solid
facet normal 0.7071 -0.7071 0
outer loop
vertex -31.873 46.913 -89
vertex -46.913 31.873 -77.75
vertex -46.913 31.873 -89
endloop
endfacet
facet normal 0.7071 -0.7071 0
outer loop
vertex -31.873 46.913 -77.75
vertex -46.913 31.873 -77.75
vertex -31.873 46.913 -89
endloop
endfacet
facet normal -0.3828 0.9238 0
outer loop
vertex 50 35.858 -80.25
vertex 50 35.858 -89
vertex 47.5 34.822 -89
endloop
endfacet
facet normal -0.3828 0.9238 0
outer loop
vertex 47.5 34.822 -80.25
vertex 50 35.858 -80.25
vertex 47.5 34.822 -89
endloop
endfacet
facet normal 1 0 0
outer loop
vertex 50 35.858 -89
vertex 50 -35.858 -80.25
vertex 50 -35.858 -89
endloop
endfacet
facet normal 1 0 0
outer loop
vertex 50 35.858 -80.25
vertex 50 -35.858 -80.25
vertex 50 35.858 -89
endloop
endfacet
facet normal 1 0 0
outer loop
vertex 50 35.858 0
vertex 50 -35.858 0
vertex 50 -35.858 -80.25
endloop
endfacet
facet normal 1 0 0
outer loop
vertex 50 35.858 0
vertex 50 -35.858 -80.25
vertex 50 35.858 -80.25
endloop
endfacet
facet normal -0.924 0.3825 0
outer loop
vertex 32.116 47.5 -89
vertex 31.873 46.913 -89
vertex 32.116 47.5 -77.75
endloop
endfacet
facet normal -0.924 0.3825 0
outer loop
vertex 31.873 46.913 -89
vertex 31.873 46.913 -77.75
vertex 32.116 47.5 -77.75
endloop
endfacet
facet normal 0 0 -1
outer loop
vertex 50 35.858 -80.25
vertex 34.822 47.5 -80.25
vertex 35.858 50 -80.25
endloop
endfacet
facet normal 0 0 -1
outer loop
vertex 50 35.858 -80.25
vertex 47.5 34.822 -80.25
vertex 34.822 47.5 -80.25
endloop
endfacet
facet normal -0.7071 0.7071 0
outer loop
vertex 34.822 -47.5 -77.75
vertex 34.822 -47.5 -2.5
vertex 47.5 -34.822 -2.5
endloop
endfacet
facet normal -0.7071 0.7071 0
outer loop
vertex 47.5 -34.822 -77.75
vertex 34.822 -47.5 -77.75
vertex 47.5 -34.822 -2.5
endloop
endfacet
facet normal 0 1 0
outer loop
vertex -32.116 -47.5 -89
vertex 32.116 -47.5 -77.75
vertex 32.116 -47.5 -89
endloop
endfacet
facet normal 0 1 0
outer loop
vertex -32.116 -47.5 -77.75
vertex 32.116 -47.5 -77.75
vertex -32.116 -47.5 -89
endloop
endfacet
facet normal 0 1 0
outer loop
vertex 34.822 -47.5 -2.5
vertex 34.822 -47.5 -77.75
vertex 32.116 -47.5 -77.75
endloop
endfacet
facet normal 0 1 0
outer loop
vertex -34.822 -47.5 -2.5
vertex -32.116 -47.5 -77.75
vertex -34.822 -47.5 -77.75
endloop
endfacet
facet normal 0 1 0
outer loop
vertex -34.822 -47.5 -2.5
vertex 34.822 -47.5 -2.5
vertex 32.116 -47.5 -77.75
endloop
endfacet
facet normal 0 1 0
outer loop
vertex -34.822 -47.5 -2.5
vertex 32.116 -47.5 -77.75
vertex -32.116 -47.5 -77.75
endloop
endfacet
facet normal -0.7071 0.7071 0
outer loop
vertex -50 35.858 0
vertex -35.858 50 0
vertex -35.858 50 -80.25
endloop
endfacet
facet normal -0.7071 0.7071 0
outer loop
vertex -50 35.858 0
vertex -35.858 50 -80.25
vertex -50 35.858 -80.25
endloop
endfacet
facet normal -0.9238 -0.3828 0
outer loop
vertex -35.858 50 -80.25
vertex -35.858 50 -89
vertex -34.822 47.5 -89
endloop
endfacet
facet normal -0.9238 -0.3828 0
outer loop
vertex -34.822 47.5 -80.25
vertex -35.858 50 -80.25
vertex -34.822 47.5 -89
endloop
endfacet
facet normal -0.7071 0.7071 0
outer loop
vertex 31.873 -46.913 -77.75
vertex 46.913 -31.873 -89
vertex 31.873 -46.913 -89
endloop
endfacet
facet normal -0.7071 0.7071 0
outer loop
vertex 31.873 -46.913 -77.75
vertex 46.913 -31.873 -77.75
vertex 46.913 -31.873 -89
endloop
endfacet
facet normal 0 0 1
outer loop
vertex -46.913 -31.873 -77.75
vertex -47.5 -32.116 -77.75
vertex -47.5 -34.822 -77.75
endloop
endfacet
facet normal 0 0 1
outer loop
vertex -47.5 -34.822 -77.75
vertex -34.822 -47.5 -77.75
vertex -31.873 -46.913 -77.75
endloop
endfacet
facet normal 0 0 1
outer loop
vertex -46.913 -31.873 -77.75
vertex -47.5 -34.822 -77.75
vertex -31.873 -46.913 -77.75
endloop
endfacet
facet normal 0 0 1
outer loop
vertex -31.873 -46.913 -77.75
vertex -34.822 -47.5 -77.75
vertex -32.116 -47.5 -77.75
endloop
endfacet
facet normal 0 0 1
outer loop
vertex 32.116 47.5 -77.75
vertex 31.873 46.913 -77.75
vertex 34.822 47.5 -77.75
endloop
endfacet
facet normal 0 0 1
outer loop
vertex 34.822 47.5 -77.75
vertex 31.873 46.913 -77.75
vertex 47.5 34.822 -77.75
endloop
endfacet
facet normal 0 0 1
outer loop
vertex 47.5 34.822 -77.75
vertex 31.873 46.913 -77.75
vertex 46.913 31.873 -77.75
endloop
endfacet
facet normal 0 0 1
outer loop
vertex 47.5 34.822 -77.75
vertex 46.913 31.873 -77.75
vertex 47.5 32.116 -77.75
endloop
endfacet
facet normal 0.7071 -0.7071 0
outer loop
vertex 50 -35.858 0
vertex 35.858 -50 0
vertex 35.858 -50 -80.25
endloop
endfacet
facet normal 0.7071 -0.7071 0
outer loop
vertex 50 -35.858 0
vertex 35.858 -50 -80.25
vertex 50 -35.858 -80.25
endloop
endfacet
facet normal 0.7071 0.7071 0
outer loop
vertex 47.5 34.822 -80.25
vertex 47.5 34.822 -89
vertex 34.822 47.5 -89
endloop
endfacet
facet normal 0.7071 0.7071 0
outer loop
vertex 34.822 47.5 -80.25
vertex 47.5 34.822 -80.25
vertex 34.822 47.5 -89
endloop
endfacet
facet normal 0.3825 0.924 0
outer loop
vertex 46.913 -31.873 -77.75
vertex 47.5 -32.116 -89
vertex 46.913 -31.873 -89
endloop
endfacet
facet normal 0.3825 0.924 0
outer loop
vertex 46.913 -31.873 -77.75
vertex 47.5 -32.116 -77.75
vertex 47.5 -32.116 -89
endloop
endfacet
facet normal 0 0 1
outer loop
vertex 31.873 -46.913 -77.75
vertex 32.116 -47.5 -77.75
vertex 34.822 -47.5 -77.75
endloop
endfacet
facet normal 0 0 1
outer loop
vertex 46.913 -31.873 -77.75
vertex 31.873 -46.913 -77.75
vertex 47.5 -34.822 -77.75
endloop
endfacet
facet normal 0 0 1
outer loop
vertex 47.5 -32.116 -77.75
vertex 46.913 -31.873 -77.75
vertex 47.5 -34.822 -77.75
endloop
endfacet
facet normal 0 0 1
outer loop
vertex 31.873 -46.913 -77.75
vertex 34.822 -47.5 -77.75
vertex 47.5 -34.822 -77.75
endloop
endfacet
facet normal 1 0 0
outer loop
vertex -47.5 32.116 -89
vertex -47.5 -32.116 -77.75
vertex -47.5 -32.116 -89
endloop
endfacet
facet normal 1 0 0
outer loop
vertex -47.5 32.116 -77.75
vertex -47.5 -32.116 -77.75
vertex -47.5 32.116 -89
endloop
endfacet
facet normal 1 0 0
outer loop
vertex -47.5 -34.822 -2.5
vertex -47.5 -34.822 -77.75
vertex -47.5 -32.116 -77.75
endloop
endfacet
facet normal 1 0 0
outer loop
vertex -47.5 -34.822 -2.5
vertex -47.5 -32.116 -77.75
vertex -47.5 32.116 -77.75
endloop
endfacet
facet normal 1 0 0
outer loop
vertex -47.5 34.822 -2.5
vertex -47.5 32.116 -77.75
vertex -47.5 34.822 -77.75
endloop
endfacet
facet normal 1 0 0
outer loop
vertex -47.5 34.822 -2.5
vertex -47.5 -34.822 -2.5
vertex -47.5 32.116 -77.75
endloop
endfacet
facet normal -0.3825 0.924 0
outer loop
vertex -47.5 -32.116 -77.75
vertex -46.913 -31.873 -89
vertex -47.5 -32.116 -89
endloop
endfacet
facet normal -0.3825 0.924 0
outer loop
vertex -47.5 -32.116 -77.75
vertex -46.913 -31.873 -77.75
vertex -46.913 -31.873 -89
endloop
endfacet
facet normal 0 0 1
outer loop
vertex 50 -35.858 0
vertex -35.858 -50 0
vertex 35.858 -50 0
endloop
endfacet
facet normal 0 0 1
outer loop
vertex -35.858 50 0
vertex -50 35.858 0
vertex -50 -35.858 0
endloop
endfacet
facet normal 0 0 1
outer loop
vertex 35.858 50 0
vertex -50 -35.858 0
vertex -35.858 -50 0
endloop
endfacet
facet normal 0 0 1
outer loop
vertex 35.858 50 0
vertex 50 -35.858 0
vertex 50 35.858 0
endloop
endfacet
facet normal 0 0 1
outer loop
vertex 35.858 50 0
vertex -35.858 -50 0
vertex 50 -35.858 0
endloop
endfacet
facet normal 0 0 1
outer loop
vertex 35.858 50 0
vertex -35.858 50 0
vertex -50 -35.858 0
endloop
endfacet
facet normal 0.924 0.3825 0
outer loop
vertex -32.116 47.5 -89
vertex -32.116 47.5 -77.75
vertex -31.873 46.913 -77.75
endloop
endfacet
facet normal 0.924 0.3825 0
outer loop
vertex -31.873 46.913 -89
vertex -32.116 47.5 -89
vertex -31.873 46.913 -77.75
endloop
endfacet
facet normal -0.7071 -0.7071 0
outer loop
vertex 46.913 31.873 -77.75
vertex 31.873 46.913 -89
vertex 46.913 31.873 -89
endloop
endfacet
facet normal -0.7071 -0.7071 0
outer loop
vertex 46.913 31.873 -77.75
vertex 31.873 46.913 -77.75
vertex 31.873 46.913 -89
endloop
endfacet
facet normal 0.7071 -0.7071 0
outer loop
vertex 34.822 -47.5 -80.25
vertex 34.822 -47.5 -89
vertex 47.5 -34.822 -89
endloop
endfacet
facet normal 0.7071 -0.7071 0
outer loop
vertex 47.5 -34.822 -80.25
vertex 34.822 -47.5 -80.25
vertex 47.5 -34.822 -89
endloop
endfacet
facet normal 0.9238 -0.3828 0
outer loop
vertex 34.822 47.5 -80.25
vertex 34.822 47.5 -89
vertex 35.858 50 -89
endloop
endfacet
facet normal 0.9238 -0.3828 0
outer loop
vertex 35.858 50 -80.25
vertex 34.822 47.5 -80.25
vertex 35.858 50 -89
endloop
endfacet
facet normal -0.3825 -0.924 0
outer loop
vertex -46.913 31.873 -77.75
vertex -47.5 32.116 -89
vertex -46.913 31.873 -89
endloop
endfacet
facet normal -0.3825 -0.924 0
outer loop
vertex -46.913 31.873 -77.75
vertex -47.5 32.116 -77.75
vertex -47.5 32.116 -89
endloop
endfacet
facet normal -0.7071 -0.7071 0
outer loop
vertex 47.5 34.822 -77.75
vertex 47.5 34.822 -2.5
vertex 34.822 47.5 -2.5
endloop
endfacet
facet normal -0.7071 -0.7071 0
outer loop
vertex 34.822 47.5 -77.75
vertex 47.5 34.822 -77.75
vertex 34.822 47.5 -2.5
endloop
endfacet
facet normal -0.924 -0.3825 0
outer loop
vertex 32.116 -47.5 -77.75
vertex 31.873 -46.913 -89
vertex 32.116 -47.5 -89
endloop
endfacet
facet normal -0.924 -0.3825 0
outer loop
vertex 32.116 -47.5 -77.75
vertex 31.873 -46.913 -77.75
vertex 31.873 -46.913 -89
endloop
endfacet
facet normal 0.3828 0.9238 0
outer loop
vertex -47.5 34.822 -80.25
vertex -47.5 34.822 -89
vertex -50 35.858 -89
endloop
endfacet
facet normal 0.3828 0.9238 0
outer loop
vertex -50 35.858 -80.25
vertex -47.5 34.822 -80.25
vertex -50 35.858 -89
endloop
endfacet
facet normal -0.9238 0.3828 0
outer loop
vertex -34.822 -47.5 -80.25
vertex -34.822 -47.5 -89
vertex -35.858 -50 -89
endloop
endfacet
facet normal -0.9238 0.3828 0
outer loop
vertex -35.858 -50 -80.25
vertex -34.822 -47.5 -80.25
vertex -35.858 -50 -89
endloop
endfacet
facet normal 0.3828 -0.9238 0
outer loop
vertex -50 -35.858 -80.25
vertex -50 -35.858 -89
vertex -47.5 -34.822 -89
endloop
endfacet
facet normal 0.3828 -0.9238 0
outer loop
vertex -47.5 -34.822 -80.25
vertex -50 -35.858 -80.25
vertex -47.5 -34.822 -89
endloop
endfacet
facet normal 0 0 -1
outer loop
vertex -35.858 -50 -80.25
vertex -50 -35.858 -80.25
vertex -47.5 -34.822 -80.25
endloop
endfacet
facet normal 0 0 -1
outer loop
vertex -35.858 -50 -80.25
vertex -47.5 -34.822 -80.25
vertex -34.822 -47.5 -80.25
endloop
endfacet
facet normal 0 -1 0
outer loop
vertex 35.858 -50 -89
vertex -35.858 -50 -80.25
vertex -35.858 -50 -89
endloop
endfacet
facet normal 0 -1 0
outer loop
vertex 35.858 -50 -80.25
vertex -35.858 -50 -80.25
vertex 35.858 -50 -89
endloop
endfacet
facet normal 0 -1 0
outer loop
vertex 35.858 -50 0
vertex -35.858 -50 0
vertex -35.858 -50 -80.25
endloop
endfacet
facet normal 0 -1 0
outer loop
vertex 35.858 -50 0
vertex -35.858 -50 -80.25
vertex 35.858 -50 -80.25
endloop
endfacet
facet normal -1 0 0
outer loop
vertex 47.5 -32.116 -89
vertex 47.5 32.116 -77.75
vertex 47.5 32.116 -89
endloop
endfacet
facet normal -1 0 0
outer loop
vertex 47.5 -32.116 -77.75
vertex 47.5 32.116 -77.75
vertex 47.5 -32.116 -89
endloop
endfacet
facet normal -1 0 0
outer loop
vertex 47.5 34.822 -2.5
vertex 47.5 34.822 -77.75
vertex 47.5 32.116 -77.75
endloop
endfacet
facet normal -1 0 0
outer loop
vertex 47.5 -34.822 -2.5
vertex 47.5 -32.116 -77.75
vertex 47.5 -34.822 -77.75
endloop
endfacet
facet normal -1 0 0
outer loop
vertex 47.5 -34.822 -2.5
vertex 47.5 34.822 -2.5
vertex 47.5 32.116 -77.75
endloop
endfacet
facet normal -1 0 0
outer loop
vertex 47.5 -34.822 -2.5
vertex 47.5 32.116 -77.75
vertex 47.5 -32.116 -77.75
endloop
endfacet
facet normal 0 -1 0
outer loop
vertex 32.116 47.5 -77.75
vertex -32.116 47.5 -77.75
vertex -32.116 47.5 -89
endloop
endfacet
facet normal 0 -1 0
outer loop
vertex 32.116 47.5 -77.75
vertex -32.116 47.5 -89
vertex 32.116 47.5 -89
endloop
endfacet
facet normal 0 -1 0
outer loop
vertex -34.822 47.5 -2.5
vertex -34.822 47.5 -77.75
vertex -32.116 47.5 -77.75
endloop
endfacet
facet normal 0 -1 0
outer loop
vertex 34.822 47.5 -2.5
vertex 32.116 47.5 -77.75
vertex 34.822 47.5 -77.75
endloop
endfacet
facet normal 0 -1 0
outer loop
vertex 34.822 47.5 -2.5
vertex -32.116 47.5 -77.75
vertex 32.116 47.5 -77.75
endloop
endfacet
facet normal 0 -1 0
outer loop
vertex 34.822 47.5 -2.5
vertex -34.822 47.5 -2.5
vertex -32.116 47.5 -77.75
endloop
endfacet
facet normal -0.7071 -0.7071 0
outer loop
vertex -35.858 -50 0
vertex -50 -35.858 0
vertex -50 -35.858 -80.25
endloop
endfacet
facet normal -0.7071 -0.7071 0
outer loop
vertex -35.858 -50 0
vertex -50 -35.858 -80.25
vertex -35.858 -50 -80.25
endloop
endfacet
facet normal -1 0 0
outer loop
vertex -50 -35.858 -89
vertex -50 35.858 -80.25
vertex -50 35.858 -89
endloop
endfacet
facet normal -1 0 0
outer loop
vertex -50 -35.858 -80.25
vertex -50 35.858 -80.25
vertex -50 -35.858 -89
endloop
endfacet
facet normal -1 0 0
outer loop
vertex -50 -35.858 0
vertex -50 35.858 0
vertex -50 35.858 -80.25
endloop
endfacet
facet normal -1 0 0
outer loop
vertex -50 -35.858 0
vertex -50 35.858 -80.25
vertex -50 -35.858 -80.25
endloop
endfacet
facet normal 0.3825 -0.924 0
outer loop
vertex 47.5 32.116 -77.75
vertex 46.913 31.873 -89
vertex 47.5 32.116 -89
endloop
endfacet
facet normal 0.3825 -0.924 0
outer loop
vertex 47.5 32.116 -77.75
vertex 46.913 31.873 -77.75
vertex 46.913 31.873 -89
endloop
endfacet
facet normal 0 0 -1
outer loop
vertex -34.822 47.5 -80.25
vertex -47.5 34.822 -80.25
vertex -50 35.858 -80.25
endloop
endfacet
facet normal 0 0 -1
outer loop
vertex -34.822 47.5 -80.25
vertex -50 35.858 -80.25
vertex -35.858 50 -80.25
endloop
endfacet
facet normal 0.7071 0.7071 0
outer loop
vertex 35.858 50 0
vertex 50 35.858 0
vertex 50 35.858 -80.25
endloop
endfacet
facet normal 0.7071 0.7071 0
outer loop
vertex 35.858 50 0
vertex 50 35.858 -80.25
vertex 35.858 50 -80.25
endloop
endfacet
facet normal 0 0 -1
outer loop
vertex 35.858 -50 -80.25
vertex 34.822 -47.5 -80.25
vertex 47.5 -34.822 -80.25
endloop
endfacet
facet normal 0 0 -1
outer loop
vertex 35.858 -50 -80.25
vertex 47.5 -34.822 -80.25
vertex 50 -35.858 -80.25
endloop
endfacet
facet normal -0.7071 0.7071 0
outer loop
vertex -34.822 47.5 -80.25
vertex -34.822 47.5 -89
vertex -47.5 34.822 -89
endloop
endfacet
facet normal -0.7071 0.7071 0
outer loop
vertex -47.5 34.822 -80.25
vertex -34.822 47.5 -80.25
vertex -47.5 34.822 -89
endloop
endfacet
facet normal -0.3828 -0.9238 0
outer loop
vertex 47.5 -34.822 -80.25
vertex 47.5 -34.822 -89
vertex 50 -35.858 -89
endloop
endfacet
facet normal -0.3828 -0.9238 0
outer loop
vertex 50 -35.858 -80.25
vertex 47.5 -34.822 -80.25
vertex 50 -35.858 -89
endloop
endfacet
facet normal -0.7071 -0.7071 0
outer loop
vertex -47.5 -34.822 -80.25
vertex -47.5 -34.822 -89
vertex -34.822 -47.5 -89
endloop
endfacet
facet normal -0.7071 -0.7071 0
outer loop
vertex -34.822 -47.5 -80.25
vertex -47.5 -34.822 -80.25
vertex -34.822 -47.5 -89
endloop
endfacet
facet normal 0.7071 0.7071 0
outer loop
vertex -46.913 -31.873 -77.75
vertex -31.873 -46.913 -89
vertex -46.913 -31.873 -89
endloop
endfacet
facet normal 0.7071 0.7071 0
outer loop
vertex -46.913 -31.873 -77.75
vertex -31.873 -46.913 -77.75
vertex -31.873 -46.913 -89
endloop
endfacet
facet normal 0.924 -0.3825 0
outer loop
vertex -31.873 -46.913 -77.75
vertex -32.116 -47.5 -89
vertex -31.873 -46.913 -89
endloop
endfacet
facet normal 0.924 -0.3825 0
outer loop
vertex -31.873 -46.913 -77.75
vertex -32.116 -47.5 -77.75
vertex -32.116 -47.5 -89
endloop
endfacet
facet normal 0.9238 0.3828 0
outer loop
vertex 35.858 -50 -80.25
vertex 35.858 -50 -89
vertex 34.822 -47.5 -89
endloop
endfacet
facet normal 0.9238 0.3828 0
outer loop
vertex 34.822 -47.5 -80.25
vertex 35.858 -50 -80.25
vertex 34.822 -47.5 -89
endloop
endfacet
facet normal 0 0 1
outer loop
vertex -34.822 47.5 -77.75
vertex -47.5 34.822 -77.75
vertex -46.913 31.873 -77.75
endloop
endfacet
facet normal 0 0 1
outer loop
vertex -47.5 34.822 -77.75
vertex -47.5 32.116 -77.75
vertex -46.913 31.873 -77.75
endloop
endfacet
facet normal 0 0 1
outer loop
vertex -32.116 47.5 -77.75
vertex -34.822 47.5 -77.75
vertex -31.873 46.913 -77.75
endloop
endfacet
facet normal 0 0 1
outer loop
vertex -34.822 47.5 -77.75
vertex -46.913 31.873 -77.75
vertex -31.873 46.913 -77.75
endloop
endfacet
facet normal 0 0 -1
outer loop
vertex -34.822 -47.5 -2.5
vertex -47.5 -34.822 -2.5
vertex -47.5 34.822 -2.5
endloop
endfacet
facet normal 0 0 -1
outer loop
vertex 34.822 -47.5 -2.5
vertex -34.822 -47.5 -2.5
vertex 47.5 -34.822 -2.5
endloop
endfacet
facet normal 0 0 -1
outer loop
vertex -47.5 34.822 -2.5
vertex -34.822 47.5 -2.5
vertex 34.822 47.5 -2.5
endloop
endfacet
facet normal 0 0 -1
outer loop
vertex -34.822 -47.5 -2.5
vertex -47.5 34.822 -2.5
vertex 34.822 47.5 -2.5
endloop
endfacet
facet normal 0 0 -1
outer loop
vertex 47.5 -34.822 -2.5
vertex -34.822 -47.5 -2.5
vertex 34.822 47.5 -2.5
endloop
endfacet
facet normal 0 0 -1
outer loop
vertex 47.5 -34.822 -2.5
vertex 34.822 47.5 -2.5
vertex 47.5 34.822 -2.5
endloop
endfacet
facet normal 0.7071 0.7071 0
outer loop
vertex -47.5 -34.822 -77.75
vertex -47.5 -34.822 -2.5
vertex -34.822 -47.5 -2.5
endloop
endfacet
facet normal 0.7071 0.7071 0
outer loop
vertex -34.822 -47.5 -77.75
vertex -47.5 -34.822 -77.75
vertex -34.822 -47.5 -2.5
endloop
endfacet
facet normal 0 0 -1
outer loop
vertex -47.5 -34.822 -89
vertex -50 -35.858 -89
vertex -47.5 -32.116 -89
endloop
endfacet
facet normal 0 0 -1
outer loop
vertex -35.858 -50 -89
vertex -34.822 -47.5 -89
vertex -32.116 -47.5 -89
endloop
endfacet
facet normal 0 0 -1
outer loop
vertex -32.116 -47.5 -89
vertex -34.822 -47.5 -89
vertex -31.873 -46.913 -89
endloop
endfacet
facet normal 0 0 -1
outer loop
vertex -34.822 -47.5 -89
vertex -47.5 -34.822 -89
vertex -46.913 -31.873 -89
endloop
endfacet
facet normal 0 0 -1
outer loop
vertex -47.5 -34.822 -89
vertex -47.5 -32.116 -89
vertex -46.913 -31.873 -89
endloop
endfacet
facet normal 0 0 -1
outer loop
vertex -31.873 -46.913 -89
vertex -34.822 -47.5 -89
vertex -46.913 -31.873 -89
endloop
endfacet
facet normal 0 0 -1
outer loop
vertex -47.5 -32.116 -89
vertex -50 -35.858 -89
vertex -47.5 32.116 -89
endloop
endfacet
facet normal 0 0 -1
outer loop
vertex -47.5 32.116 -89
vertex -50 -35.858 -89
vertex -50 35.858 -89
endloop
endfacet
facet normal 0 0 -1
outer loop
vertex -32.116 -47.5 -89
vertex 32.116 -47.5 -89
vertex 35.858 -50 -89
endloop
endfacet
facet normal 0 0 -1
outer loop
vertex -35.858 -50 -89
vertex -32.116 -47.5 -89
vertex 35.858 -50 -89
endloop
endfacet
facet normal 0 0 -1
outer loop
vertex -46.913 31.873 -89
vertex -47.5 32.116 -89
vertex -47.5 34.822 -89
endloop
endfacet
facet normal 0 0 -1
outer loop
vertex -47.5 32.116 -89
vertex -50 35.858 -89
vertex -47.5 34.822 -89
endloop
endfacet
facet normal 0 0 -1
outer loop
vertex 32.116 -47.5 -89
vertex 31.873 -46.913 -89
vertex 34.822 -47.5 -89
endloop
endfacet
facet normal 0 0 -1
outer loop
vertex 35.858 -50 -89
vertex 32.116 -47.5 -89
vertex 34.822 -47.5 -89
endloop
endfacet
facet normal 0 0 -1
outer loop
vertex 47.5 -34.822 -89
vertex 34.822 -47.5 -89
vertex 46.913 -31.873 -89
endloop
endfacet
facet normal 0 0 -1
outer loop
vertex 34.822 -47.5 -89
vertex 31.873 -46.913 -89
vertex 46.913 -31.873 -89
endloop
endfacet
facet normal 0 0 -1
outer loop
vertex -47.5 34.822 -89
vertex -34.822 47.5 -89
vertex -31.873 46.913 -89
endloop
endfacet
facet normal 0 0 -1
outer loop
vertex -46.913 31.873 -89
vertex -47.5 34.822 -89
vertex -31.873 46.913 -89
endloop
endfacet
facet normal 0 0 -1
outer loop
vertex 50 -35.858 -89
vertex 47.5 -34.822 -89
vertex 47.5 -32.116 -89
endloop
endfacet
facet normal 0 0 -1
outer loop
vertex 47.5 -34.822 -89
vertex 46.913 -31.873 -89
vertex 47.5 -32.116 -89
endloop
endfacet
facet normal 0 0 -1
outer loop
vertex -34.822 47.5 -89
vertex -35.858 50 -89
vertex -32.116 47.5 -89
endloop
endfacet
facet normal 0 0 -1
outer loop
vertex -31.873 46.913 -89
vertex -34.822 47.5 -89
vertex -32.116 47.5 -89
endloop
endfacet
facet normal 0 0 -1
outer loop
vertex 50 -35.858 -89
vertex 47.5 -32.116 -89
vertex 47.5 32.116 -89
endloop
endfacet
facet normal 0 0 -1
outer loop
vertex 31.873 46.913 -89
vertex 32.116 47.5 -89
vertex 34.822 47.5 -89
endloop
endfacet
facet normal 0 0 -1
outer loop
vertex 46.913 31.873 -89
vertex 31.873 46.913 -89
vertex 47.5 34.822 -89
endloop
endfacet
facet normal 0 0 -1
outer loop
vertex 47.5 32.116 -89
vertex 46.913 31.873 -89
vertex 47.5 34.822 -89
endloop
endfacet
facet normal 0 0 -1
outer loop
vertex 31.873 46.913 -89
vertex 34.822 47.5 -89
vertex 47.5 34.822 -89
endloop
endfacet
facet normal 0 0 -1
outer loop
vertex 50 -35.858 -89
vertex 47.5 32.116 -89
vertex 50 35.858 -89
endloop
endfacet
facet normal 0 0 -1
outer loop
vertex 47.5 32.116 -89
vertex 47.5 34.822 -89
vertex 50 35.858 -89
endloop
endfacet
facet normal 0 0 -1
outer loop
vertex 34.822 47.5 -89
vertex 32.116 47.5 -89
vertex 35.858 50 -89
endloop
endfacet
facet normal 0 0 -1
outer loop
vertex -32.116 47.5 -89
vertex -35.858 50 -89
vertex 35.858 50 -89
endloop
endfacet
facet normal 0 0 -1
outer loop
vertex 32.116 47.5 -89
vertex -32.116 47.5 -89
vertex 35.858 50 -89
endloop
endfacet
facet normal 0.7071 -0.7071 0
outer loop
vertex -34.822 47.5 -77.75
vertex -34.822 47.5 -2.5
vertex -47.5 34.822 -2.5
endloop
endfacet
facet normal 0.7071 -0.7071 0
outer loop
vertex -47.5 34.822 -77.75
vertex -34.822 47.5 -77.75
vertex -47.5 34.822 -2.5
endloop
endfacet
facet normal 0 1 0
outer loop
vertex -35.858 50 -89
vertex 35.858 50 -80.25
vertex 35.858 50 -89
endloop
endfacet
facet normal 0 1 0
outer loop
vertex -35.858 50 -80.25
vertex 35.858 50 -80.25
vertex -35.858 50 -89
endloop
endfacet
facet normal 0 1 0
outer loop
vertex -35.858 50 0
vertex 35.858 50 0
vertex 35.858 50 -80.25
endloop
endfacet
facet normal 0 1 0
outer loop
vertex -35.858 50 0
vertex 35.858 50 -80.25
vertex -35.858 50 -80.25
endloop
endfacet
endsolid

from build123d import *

# Parameters (mm, degrees)
F1_DEPTH = 89
F3_DEPTH = 8.75
F4_T     = -2.5


# Not quite as in the source:
# - a shell that OpenCascade refuses in one call is made with other operations: the cavity is built on its own and cut out


with BuildPart() as f1:
    # F0 (on Top) → F1 (new body)
    with BuildSketch(Plane.XY):
        Polygon((50, 35.8578643763), (35.8578643763, 50), (-35.8578643763, 50), (-50, 35.8578643763), (-50, -35.8578643763), (-35.8578643763, -50), (35.8578643763, -50), (50, -35.8578643763), align=None)
    extrude(amount=-F1_DEPTH)

    # F2 (on face) → F3 (cut)
    with BuildSketch(Plane(origin=(0, 0, -89), x_dir=(1, 0, 0), z_dir=(0, 0, -1))):
        Polygon((-50, 35.8578643763), (-47.5, 34.8223305494), (-34.8223305494, 47.5), (-35.8578643763, 50), align=None)
        Polygon((-47.5, -34.8223304703), (-50, -35.8578643763), (-35.8578643763, -50), (-34.8223304703, -47.5), align=None)
        Polygon((50, 35.8578643763), (35.8578643763, 50), (34.8223305494, 47.5), (47.5, 34.8223305494), align=None)
        Polygon((34.8223305494, -47.5), (35.8578643763, -50), (50, -35.8578643763), (47.5, -34.8223305494), align=None)
    extrude(amount=-F3_DEPTH, mode=Mode.SUBTRACT)

    # F4: a shell. OpenCascade refuses it in one call, so the cavity is built on its own and cut out:
    # the body offset inwards by the wall thickness, plus a prism from it out through each open face.
    f4_core = offset(f1.part, amount=F4_T, kind=Kind.INTERSECTION, mode=Mode.PRIVATE)
    f4_exits = [f4_core.faces().sort_by_distance(p)[0] for p in [
        (0, 0, -86.5),
    ]]
    add(f4_core, mode=Mode.SUBTRACT)
    extrude(f4_exits, amount=-F4_T, mode=Mode.SUBTRACT)


solid = f1.part
